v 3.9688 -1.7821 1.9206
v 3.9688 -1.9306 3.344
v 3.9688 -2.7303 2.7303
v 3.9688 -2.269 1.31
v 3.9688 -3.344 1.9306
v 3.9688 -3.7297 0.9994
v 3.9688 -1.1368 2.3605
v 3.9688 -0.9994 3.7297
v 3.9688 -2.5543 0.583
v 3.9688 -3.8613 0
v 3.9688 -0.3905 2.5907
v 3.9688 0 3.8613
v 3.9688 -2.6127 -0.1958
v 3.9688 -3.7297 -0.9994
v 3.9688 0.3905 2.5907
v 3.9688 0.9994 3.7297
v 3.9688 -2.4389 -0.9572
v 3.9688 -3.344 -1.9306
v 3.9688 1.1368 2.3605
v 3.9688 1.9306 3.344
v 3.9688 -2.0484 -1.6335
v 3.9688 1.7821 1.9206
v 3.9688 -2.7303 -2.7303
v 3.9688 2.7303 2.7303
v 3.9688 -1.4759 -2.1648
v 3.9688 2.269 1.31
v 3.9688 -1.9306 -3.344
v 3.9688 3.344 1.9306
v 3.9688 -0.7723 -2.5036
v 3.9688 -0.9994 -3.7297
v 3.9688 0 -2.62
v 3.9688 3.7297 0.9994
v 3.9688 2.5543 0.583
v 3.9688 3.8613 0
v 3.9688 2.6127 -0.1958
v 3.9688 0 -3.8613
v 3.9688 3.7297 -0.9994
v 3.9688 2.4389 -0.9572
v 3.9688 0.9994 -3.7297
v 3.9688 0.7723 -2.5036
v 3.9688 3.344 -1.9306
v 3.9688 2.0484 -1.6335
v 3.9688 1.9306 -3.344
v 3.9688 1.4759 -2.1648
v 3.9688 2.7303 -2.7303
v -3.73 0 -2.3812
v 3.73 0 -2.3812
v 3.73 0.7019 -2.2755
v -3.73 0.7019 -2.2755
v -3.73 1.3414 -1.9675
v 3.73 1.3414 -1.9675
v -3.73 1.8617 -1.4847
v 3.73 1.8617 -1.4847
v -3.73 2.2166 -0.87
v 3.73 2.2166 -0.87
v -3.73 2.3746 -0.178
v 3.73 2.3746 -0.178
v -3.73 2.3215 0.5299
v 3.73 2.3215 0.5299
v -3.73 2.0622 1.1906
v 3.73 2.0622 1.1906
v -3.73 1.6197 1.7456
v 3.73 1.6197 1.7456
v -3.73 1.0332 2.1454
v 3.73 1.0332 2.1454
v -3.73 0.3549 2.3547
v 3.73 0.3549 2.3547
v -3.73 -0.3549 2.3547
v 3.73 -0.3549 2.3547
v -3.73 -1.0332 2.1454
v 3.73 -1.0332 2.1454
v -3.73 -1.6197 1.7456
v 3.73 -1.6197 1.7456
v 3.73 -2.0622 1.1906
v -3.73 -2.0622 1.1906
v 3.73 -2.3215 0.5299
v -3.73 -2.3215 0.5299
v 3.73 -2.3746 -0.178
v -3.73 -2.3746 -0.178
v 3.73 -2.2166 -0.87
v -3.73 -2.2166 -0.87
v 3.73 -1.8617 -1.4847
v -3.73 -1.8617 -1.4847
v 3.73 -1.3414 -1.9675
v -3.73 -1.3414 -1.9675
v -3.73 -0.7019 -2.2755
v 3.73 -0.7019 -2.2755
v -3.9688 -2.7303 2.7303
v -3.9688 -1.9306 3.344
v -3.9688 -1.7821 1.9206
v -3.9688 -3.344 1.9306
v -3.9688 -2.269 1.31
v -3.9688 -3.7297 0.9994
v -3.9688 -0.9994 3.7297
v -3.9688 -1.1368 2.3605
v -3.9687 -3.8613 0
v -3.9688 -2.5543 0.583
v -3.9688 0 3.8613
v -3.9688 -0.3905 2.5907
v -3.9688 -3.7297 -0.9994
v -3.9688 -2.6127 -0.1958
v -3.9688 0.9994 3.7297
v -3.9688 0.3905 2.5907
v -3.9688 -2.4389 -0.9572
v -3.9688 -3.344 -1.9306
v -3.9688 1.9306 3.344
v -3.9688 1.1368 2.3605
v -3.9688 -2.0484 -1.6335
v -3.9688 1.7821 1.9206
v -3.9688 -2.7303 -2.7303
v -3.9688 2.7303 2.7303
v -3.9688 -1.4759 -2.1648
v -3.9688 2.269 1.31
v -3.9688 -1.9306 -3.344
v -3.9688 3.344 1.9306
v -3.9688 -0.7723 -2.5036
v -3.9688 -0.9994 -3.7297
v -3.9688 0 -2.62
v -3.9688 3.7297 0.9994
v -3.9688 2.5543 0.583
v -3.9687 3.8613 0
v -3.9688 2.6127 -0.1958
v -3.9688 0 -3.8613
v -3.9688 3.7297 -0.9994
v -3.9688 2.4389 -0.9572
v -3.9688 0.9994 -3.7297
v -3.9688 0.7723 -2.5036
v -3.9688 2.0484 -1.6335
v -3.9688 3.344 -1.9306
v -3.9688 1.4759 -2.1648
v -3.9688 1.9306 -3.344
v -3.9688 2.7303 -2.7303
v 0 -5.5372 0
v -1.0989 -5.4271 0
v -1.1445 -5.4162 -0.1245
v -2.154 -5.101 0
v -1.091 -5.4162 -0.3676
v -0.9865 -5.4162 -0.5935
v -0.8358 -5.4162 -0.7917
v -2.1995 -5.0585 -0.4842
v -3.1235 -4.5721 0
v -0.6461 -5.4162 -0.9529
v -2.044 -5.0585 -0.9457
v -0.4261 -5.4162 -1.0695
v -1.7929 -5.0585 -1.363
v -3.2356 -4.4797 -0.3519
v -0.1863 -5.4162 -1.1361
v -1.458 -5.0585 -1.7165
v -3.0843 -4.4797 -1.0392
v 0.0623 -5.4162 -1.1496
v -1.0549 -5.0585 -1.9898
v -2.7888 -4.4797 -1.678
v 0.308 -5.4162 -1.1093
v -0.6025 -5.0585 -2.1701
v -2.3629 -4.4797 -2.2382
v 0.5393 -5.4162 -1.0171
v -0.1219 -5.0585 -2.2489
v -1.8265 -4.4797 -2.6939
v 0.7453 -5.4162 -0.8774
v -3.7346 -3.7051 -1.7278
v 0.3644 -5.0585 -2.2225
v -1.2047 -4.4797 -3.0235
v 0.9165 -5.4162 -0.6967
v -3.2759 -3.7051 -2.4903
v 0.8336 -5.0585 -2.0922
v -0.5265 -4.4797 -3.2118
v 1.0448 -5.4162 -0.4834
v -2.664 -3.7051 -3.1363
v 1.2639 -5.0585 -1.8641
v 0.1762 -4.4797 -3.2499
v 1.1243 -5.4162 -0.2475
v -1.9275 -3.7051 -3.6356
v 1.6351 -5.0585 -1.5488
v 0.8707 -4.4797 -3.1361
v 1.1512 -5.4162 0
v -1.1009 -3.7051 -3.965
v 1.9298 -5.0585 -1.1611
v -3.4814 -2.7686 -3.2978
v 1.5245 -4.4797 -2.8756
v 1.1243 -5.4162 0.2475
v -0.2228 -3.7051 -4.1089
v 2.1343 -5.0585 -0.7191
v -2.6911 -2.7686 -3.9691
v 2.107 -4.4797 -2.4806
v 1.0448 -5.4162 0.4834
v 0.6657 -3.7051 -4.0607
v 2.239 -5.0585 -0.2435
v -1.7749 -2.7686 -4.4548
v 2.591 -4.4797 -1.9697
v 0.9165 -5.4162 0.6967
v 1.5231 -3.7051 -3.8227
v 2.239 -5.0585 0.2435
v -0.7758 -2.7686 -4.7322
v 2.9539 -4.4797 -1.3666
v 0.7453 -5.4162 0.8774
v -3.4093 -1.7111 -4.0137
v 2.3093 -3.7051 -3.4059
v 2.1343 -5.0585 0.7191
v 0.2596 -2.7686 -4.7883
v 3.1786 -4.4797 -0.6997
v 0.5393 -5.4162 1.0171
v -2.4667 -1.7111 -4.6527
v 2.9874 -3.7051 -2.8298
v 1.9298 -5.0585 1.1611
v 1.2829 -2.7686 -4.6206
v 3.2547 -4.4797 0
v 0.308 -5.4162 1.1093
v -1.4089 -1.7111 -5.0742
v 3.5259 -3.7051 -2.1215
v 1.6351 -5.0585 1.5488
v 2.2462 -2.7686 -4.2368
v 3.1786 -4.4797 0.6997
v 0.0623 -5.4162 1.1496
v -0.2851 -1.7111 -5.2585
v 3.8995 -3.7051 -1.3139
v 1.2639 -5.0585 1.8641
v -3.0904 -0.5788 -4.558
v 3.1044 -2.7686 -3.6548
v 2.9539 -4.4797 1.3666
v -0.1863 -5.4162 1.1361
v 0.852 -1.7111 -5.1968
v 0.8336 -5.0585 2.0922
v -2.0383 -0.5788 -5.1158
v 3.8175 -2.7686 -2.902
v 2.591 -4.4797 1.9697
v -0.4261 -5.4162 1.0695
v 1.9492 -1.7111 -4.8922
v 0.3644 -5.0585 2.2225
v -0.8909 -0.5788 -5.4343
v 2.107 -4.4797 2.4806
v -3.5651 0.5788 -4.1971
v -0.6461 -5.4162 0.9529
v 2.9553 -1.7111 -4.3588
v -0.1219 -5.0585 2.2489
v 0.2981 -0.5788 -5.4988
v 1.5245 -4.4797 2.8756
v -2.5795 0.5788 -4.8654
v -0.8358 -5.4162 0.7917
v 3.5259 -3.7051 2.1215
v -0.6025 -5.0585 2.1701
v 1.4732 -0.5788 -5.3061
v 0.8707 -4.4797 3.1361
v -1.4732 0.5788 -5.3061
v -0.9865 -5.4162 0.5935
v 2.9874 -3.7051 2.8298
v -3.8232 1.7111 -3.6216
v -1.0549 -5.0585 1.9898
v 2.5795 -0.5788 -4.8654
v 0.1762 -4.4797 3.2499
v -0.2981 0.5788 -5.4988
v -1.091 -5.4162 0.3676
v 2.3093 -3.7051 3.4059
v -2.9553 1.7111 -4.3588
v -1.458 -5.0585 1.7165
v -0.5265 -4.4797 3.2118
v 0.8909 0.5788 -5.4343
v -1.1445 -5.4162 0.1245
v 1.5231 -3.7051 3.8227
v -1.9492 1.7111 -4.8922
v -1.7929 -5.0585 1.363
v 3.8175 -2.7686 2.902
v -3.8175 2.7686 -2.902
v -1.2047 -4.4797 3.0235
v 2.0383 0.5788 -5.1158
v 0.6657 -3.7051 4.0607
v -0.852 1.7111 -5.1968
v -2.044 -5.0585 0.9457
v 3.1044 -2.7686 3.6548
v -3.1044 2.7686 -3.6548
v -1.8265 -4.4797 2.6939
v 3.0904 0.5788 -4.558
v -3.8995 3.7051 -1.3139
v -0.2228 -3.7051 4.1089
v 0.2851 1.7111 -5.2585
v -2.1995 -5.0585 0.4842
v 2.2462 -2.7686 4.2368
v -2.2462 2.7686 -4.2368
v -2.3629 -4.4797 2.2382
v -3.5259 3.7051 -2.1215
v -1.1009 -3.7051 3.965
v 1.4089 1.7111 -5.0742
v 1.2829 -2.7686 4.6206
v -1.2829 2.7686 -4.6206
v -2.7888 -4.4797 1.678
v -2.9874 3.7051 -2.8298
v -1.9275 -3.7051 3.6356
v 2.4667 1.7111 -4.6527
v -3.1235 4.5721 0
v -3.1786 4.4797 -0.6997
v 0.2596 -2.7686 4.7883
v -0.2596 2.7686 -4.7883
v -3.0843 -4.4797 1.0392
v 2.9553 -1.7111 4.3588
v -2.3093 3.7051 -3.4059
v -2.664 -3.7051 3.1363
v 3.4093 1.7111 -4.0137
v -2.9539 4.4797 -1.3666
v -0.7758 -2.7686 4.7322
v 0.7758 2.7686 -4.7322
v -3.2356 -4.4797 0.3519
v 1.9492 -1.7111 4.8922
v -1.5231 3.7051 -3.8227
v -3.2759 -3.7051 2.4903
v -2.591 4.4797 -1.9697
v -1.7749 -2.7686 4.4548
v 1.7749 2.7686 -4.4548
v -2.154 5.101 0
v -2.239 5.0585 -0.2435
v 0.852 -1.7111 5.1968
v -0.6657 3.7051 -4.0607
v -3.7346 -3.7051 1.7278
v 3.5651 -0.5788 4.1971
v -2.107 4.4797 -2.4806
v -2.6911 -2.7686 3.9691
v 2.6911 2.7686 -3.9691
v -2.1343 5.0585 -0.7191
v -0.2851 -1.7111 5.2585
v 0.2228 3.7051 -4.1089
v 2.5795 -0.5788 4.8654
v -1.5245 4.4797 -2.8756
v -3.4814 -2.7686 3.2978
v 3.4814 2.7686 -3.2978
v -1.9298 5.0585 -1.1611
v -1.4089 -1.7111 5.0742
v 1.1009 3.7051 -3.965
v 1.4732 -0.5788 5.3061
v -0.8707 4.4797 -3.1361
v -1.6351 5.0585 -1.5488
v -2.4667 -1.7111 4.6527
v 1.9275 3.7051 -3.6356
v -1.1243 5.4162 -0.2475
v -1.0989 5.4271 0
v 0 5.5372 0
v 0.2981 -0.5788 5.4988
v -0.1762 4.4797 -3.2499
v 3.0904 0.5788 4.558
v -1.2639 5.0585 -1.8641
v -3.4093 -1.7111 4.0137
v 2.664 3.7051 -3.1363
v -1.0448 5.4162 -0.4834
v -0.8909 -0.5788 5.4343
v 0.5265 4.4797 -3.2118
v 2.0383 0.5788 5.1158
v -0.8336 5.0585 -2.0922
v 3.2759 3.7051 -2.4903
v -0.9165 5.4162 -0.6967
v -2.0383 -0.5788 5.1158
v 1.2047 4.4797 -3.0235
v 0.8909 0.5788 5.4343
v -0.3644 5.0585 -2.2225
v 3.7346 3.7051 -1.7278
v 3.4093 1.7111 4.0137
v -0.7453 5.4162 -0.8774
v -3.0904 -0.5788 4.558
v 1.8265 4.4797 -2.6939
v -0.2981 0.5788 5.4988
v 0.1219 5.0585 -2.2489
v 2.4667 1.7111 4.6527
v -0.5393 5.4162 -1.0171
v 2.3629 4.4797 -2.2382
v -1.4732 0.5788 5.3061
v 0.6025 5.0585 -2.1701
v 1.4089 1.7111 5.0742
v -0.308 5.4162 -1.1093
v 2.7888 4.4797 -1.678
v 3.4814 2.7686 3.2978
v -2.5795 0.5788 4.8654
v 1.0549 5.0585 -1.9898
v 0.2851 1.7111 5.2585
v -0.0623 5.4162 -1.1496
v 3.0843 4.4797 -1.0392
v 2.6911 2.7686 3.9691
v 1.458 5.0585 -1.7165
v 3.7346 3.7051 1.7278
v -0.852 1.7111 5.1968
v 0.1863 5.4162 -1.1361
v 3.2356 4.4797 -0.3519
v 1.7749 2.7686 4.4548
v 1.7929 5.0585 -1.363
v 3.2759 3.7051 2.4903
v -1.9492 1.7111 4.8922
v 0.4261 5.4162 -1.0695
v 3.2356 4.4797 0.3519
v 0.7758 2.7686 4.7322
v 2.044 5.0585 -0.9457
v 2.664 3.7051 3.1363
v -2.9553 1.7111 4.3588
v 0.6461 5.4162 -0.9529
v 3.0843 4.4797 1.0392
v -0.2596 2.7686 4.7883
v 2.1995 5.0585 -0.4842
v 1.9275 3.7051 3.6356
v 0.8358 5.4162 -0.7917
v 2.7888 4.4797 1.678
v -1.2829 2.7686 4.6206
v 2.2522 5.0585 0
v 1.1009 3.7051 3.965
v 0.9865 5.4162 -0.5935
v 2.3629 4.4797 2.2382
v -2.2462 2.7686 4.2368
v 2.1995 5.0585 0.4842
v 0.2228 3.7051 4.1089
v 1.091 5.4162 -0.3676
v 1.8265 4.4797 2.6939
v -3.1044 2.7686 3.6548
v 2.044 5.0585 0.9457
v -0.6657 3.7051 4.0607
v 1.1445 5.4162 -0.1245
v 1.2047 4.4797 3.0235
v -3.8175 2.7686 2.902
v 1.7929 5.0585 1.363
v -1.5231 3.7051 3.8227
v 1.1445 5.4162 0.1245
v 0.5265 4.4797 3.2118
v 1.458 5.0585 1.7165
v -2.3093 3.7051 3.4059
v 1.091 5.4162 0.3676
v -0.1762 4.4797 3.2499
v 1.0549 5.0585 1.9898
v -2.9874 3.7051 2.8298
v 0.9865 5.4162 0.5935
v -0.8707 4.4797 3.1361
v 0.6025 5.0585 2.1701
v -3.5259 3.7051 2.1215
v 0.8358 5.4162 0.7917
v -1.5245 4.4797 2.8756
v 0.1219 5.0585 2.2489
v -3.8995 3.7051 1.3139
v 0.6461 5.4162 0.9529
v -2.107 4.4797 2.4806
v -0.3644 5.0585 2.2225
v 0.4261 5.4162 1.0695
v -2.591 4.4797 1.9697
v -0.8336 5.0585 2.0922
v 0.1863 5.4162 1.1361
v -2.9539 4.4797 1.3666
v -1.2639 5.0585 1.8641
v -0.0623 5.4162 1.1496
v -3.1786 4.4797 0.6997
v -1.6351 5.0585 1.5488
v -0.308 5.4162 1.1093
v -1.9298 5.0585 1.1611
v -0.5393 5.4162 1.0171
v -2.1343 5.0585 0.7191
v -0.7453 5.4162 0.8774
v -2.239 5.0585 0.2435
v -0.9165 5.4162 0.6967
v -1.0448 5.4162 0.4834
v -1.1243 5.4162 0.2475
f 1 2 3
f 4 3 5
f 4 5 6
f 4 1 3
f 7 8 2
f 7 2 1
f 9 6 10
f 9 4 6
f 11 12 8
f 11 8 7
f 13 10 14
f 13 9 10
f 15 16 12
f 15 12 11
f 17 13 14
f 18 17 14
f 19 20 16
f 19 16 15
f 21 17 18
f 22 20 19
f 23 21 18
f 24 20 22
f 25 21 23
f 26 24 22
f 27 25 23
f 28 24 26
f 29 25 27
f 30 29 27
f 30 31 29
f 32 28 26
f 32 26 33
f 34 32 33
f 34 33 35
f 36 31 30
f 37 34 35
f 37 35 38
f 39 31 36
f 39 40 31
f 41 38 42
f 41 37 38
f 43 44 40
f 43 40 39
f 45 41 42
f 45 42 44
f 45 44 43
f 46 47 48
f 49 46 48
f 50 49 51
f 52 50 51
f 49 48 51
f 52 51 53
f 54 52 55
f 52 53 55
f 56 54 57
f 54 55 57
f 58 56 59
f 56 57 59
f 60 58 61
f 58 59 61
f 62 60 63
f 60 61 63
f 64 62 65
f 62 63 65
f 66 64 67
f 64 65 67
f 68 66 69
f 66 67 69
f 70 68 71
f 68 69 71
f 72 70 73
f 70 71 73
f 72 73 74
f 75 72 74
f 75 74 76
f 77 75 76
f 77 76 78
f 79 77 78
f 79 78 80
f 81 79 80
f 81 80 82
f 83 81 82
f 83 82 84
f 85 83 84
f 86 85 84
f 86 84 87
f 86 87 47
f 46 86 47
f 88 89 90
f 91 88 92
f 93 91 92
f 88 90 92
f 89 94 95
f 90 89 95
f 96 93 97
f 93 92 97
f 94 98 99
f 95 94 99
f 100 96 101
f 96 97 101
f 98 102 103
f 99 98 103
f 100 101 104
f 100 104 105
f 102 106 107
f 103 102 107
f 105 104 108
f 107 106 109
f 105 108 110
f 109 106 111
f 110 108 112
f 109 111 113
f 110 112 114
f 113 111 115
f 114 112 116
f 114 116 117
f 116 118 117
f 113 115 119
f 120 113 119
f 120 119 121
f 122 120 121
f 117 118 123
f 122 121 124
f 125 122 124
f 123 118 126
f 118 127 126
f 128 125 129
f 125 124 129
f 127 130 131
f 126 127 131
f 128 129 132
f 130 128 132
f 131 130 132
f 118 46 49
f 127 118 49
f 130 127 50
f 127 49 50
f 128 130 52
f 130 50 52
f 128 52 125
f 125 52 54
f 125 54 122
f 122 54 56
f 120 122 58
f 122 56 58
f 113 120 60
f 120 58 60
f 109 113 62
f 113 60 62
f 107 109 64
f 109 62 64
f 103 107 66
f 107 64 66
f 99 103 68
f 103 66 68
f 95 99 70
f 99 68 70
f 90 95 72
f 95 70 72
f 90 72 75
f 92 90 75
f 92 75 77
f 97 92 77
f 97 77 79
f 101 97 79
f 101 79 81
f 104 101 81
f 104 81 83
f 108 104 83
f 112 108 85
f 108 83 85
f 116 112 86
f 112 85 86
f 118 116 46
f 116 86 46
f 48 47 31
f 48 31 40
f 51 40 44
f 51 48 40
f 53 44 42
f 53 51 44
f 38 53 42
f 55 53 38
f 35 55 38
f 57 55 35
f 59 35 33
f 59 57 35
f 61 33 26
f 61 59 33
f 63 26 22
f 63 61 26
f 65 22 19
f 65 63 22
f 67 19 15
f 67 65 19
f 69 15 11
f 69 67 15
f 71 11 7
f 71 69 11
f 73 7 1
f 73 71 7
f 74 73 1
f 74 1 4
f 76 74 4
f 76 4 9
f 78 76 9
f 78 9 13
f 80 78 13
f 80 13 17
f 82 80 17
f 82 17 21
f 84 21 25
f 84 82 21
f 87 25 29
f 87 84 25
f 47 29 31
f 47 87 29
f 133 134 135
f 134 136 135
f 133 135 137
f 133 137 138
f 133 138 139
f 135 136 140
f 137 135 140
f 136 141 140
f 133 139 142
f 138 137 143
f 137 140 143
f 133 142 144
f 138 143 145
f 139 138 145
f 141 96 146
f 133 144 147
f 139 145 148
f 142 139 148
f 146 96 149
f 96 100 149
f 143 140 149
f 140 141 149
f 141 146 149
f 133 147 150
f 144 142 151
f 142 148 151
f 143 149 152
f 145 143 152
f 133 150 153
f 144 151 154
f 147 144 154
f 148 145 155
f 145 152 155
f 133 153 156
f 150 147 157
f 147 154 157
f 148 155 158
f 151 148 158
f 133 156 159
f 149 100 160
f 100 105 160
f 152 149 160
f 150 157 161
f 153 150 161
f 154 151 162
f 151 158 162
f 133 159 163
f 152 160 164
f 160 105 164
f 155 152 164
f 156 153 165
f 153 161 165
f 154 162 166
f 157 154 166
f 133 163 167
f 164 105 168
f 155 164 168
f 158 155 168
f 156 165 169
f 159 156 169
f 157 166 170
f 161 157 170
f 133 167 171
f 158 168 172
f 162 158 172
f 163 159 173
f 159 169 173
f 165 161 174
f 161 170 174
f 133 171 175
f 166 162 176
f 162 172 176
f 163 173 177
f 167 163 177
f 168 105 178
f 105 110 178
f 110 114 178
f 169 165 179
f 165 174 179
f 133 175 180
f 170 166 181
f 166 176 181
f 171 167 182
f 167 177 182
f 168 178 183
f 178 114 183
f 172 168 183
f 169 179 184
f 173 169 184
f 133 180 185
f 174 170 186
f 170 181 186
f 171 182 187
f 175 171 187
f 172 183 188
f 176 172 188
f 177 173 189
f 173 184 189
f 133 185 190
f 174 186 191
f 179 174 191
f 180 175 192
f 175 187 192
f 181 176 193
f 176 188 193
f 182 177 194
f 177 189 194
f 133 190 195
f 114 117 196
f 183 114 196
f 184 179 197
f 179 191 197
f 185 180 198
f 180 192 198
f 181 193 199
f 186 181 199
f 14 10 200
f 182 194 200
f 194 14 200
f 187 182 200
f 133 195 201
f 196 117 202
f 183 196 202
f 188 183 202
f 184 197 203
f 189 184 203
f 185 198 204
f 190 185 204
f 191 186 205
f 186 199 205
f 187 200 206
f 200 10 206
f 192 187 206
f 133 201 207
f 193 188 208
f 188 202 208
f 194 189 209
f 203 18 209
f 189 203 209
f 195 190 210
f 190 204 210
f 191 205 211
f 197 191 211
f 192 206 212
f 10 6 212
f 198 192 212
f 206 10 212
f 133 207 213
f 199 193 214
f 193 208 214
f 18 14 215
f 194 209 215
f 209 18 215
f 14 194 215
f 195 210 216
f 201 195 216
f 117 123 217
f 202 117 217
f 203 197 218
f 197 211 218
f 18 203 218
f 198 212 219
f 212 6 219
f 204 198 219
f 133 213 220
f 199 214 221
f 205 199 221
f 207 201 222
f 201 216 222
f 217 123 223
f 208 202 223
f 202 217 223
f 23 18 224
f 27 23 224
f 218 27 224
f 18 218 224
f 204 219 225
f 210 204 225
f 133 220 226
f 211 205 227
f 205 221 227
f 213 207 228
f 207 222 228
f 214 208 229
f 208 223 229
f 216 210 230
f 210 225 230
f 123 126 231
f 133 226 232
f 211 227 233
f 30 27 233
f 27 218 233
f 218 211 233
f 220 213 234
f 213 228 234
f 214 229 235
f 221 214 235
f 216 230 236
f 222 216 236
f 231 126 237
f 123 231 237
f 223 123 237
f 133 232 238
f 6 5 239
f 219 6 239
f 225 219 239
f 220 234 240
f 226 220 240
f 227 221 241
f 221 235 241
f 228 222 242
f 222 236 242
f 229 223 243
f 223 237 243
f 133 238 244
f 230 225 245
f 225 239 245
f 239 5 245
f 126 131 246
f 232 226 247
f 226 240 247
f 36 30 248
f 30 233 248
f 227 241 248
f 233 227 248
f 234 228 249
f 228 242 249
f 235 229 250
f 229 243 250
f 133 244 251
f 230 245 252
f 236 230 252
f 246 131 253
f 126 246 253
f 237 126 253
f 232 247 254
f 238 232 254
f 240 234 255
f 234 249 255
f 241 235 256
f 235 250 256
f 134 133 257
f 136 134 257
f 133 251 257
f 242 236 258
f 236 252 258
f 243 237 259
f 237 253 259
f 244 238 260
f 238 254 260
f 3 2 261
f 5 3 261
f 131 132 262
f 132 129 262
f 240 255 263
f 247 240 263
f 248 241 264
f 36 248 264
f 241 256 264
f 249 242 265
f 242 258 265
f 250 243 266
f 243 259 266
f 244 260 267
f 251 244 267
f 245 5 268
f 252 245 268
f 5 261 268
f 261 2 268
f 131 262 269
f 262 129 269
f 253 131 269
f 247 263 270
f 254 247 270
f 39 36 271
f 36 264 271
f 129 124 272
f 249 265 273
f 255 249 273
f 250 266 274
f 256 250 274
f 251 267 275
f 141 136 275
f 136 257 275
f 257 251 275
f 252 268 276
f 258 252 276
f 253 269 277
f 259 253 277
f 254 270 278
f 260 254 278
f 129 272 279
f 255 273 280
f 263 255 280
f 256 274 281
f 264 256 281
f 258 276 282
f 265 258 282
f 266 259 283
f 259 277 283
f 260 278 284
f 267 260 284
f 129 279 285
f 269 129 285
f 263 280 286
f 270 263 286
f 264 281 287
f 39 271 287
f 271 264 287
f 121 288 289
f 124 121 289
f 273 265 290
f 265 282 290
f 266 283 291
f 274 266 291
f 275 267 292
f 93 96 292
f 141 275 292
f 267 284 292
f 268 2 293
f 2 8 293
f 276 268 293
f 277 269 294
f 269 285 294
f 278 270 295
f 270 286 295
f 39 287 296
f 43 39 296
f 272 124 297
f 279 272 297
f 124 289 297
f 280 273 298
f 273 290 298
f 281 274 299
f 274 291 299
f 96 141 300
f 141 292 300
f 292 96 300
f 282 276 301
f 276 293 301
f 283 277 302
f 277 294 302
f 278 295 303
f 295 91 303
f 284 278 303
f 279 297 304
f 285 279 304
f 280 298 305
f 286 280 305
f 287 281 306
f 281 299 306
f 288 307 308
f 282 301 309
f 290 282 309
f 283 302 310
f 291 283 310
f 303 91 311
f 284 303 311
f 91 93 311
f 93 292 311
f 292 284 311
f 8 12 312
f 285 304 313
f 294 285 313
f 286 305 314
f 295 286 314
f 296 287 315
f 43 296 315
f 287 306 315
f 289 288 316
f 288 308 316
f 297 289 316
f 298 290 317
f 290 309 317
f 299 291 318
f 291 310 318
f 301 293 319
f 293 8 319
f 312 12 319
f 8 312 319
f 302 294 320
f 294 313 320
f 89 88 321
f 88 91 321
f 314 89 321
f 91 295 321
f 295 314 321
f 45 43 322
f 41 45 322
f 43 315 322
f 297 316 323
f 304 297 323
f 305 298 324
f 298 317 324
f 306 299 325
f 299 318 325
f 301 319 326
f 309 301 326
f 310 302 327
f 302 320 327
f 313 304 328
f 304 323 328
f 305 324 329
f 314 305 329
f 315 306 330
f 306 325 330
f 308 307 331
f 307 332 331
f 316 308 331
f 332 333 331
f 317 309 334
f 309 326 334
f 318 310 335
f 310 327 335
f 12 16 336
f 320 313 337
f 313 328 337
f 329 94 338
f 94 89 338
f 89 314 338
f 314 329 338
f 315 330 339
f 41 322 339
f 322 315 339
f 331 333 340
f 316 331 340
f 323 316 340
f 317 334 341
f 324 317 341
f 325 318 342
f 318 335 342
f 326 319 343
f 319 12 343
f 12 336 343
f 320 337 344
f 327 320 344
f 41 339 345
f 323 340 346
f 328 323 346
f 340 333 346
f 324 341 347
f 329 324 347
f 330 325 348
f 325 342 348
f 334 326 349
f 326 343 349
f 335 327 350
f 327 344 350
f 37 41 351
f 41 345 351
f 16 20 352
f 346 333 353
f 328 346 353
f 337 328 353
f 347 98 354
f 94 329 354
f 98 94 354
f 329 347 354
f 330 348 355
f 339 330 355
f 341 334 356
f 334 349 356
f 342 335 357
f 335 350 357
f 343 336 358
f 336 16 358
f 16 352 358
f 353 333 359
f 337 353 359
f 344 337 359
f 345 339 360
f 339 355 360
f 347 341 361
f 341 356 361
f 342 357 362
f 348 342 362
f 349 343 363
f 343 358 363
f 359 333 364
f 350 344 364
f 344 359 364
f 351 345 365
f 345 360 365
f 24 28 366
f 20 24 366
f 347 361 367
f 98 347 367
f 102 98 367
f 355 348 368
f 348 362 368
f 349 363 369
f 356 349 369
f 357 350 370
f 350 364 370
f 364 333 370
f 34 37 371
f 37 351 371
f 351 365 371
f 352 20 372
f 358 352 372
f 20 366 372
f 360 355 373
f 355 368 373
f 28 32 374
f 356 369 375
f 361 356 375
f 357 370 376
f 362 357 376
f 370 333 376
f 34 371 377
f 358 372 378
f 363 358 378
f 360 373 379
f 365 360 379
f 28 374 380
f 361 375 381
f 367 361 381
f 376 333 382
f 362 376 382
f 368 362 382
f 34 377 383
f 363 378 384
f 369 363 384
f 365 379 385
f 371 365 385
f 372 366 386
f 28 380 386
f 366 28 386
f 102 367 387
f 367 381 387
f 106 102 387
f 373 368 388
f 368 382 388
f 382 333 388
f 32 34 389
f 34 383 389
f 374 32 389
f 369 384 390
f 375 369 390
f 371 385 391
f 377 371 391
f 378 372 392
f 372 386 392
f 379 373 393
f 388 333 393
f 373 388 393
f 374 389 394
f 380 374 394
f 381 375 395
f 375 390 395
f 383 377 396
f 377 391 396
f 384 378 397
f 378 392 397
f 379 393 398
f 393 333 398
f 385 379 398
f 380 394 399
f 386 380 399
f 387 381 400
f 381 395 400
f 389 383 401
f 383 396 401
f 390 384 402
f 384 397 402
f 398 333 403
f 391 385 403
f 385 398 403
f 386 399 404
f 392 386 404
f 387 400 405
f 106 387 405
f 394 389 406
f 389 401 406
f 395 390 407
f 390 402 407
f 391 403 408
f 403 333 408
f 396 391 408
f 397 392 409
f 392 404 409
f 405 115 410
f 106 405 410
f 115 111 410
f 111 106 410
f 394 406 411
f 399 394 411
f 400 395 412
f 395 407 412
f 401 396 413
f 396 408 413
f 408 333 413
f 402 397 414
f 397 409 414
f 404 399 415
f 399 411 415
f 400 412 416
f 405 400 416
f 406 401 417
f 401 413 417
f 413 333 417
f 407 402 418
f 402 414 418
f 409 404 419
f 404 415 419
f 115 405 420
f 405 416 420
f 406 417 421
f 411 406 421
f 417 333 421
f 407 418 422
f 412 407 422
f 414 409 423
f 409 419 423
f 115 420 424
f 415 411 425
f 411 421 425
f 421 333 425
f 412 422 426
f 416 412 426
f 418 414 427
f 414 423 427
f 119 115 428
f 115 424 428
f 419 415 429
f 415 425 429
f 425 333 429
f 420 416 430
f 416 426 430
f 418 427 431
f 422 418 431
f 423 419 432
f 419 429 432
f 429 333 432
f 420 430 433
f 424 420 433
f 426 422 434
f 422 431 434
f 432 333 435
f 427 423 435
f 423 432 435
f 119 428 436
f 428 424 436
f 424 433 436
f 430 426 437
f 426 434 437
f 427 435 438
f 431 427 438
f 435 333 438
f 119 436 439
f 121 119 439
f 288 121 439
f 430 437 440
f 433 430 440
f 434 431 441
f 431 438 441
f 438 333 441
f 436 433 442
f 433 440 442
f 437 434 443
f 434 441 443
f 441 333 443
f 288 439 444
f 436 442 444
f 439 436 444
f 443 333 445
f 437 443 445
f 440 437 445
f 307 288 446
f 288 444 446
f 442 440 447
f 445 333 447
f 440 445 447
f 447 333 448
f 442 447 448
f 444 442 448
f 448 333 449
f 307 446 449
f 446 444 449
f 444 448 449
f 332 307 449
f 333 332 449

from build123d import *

# Parameters (mm, degrees)
SKETCH2_R               = 2.38125
CUT_EXTRUDE1_DEPTH      = 6.5372
CUT_EXTRUDE1_DEPTH_BACK = 6.5372
CUT_EXTRUDE2_START      = 3.96875
SKETCH3_R               = 5
CUT_EXTRUDE2_DEPTH      = 2.030273132
CHAMFER1_SIZE           = 0.23876


with BuildPart() as part:
    # Sketch1 → Revolve1 (revolve)
    with BuildSketch(Plane.XY):
        with BuildLine():
            Line((0, 5.5372), (0, -5.5372))
            ThreePointArc((0, -5.5372), (-5.5372, 0), (0, 5.5372))
        make_face()
    revolve(axis=Axis((0, 5.5372, 0), (0, -1, 0)))

    # Sketch2 → Cut-Extrude1 (cut, two sides)
    with BuildSketch(Plane(origin=(0, 0, 0), x_dir=(0, 0, -1), z_dir=(1, 0, 0))) as cut_extrude1_sk:
        Circle(SKETCH2_R)
    extrude(amount=CUT_EXTRUDE1_DEPTH, mode=Mode.SUBTRACT)
    extrude(cut_extrude1_sk.sketch, amount=-CUT_EXTRUDE1_DEPTH_BACK, mode=Mode.SUBTRACT)

    # Sketch3 → Cut-Extrude2 (cut, through all)
    with BuildSketch(Plane(origin=(0, 0, 0), x_dir=(0, 0, -1), z_dir=(1, 0, 0)).offset(CUT_EXTRUDE2_START)):
        Circle(SKETCH3_R)
    cut_extrude2 = extrude(amount=CUT_EXTRUDE2_DEPTH, mode=Mode.SUBTRACT)

    # Mirror1: Cut-Extrude2 across plane
    add(cut_extrude2.mirror(Plane(origin=(0, 0, 0), x_dir=(0, 0, 1), z_dir=(1, 0, 0))), mode=Mode.SUBTRACT)

    # Chamfer1
    chamfer1_edges = [part.edges().sort_by_distance(p)[0] for p in [
        (3.96875, 0, 2.38125),
        (-3.96875, 0, 2.38125),
    ]]
    chamfer(chamfer1_edges, length=CHAMFER1_SIZE)


solid = part.part
